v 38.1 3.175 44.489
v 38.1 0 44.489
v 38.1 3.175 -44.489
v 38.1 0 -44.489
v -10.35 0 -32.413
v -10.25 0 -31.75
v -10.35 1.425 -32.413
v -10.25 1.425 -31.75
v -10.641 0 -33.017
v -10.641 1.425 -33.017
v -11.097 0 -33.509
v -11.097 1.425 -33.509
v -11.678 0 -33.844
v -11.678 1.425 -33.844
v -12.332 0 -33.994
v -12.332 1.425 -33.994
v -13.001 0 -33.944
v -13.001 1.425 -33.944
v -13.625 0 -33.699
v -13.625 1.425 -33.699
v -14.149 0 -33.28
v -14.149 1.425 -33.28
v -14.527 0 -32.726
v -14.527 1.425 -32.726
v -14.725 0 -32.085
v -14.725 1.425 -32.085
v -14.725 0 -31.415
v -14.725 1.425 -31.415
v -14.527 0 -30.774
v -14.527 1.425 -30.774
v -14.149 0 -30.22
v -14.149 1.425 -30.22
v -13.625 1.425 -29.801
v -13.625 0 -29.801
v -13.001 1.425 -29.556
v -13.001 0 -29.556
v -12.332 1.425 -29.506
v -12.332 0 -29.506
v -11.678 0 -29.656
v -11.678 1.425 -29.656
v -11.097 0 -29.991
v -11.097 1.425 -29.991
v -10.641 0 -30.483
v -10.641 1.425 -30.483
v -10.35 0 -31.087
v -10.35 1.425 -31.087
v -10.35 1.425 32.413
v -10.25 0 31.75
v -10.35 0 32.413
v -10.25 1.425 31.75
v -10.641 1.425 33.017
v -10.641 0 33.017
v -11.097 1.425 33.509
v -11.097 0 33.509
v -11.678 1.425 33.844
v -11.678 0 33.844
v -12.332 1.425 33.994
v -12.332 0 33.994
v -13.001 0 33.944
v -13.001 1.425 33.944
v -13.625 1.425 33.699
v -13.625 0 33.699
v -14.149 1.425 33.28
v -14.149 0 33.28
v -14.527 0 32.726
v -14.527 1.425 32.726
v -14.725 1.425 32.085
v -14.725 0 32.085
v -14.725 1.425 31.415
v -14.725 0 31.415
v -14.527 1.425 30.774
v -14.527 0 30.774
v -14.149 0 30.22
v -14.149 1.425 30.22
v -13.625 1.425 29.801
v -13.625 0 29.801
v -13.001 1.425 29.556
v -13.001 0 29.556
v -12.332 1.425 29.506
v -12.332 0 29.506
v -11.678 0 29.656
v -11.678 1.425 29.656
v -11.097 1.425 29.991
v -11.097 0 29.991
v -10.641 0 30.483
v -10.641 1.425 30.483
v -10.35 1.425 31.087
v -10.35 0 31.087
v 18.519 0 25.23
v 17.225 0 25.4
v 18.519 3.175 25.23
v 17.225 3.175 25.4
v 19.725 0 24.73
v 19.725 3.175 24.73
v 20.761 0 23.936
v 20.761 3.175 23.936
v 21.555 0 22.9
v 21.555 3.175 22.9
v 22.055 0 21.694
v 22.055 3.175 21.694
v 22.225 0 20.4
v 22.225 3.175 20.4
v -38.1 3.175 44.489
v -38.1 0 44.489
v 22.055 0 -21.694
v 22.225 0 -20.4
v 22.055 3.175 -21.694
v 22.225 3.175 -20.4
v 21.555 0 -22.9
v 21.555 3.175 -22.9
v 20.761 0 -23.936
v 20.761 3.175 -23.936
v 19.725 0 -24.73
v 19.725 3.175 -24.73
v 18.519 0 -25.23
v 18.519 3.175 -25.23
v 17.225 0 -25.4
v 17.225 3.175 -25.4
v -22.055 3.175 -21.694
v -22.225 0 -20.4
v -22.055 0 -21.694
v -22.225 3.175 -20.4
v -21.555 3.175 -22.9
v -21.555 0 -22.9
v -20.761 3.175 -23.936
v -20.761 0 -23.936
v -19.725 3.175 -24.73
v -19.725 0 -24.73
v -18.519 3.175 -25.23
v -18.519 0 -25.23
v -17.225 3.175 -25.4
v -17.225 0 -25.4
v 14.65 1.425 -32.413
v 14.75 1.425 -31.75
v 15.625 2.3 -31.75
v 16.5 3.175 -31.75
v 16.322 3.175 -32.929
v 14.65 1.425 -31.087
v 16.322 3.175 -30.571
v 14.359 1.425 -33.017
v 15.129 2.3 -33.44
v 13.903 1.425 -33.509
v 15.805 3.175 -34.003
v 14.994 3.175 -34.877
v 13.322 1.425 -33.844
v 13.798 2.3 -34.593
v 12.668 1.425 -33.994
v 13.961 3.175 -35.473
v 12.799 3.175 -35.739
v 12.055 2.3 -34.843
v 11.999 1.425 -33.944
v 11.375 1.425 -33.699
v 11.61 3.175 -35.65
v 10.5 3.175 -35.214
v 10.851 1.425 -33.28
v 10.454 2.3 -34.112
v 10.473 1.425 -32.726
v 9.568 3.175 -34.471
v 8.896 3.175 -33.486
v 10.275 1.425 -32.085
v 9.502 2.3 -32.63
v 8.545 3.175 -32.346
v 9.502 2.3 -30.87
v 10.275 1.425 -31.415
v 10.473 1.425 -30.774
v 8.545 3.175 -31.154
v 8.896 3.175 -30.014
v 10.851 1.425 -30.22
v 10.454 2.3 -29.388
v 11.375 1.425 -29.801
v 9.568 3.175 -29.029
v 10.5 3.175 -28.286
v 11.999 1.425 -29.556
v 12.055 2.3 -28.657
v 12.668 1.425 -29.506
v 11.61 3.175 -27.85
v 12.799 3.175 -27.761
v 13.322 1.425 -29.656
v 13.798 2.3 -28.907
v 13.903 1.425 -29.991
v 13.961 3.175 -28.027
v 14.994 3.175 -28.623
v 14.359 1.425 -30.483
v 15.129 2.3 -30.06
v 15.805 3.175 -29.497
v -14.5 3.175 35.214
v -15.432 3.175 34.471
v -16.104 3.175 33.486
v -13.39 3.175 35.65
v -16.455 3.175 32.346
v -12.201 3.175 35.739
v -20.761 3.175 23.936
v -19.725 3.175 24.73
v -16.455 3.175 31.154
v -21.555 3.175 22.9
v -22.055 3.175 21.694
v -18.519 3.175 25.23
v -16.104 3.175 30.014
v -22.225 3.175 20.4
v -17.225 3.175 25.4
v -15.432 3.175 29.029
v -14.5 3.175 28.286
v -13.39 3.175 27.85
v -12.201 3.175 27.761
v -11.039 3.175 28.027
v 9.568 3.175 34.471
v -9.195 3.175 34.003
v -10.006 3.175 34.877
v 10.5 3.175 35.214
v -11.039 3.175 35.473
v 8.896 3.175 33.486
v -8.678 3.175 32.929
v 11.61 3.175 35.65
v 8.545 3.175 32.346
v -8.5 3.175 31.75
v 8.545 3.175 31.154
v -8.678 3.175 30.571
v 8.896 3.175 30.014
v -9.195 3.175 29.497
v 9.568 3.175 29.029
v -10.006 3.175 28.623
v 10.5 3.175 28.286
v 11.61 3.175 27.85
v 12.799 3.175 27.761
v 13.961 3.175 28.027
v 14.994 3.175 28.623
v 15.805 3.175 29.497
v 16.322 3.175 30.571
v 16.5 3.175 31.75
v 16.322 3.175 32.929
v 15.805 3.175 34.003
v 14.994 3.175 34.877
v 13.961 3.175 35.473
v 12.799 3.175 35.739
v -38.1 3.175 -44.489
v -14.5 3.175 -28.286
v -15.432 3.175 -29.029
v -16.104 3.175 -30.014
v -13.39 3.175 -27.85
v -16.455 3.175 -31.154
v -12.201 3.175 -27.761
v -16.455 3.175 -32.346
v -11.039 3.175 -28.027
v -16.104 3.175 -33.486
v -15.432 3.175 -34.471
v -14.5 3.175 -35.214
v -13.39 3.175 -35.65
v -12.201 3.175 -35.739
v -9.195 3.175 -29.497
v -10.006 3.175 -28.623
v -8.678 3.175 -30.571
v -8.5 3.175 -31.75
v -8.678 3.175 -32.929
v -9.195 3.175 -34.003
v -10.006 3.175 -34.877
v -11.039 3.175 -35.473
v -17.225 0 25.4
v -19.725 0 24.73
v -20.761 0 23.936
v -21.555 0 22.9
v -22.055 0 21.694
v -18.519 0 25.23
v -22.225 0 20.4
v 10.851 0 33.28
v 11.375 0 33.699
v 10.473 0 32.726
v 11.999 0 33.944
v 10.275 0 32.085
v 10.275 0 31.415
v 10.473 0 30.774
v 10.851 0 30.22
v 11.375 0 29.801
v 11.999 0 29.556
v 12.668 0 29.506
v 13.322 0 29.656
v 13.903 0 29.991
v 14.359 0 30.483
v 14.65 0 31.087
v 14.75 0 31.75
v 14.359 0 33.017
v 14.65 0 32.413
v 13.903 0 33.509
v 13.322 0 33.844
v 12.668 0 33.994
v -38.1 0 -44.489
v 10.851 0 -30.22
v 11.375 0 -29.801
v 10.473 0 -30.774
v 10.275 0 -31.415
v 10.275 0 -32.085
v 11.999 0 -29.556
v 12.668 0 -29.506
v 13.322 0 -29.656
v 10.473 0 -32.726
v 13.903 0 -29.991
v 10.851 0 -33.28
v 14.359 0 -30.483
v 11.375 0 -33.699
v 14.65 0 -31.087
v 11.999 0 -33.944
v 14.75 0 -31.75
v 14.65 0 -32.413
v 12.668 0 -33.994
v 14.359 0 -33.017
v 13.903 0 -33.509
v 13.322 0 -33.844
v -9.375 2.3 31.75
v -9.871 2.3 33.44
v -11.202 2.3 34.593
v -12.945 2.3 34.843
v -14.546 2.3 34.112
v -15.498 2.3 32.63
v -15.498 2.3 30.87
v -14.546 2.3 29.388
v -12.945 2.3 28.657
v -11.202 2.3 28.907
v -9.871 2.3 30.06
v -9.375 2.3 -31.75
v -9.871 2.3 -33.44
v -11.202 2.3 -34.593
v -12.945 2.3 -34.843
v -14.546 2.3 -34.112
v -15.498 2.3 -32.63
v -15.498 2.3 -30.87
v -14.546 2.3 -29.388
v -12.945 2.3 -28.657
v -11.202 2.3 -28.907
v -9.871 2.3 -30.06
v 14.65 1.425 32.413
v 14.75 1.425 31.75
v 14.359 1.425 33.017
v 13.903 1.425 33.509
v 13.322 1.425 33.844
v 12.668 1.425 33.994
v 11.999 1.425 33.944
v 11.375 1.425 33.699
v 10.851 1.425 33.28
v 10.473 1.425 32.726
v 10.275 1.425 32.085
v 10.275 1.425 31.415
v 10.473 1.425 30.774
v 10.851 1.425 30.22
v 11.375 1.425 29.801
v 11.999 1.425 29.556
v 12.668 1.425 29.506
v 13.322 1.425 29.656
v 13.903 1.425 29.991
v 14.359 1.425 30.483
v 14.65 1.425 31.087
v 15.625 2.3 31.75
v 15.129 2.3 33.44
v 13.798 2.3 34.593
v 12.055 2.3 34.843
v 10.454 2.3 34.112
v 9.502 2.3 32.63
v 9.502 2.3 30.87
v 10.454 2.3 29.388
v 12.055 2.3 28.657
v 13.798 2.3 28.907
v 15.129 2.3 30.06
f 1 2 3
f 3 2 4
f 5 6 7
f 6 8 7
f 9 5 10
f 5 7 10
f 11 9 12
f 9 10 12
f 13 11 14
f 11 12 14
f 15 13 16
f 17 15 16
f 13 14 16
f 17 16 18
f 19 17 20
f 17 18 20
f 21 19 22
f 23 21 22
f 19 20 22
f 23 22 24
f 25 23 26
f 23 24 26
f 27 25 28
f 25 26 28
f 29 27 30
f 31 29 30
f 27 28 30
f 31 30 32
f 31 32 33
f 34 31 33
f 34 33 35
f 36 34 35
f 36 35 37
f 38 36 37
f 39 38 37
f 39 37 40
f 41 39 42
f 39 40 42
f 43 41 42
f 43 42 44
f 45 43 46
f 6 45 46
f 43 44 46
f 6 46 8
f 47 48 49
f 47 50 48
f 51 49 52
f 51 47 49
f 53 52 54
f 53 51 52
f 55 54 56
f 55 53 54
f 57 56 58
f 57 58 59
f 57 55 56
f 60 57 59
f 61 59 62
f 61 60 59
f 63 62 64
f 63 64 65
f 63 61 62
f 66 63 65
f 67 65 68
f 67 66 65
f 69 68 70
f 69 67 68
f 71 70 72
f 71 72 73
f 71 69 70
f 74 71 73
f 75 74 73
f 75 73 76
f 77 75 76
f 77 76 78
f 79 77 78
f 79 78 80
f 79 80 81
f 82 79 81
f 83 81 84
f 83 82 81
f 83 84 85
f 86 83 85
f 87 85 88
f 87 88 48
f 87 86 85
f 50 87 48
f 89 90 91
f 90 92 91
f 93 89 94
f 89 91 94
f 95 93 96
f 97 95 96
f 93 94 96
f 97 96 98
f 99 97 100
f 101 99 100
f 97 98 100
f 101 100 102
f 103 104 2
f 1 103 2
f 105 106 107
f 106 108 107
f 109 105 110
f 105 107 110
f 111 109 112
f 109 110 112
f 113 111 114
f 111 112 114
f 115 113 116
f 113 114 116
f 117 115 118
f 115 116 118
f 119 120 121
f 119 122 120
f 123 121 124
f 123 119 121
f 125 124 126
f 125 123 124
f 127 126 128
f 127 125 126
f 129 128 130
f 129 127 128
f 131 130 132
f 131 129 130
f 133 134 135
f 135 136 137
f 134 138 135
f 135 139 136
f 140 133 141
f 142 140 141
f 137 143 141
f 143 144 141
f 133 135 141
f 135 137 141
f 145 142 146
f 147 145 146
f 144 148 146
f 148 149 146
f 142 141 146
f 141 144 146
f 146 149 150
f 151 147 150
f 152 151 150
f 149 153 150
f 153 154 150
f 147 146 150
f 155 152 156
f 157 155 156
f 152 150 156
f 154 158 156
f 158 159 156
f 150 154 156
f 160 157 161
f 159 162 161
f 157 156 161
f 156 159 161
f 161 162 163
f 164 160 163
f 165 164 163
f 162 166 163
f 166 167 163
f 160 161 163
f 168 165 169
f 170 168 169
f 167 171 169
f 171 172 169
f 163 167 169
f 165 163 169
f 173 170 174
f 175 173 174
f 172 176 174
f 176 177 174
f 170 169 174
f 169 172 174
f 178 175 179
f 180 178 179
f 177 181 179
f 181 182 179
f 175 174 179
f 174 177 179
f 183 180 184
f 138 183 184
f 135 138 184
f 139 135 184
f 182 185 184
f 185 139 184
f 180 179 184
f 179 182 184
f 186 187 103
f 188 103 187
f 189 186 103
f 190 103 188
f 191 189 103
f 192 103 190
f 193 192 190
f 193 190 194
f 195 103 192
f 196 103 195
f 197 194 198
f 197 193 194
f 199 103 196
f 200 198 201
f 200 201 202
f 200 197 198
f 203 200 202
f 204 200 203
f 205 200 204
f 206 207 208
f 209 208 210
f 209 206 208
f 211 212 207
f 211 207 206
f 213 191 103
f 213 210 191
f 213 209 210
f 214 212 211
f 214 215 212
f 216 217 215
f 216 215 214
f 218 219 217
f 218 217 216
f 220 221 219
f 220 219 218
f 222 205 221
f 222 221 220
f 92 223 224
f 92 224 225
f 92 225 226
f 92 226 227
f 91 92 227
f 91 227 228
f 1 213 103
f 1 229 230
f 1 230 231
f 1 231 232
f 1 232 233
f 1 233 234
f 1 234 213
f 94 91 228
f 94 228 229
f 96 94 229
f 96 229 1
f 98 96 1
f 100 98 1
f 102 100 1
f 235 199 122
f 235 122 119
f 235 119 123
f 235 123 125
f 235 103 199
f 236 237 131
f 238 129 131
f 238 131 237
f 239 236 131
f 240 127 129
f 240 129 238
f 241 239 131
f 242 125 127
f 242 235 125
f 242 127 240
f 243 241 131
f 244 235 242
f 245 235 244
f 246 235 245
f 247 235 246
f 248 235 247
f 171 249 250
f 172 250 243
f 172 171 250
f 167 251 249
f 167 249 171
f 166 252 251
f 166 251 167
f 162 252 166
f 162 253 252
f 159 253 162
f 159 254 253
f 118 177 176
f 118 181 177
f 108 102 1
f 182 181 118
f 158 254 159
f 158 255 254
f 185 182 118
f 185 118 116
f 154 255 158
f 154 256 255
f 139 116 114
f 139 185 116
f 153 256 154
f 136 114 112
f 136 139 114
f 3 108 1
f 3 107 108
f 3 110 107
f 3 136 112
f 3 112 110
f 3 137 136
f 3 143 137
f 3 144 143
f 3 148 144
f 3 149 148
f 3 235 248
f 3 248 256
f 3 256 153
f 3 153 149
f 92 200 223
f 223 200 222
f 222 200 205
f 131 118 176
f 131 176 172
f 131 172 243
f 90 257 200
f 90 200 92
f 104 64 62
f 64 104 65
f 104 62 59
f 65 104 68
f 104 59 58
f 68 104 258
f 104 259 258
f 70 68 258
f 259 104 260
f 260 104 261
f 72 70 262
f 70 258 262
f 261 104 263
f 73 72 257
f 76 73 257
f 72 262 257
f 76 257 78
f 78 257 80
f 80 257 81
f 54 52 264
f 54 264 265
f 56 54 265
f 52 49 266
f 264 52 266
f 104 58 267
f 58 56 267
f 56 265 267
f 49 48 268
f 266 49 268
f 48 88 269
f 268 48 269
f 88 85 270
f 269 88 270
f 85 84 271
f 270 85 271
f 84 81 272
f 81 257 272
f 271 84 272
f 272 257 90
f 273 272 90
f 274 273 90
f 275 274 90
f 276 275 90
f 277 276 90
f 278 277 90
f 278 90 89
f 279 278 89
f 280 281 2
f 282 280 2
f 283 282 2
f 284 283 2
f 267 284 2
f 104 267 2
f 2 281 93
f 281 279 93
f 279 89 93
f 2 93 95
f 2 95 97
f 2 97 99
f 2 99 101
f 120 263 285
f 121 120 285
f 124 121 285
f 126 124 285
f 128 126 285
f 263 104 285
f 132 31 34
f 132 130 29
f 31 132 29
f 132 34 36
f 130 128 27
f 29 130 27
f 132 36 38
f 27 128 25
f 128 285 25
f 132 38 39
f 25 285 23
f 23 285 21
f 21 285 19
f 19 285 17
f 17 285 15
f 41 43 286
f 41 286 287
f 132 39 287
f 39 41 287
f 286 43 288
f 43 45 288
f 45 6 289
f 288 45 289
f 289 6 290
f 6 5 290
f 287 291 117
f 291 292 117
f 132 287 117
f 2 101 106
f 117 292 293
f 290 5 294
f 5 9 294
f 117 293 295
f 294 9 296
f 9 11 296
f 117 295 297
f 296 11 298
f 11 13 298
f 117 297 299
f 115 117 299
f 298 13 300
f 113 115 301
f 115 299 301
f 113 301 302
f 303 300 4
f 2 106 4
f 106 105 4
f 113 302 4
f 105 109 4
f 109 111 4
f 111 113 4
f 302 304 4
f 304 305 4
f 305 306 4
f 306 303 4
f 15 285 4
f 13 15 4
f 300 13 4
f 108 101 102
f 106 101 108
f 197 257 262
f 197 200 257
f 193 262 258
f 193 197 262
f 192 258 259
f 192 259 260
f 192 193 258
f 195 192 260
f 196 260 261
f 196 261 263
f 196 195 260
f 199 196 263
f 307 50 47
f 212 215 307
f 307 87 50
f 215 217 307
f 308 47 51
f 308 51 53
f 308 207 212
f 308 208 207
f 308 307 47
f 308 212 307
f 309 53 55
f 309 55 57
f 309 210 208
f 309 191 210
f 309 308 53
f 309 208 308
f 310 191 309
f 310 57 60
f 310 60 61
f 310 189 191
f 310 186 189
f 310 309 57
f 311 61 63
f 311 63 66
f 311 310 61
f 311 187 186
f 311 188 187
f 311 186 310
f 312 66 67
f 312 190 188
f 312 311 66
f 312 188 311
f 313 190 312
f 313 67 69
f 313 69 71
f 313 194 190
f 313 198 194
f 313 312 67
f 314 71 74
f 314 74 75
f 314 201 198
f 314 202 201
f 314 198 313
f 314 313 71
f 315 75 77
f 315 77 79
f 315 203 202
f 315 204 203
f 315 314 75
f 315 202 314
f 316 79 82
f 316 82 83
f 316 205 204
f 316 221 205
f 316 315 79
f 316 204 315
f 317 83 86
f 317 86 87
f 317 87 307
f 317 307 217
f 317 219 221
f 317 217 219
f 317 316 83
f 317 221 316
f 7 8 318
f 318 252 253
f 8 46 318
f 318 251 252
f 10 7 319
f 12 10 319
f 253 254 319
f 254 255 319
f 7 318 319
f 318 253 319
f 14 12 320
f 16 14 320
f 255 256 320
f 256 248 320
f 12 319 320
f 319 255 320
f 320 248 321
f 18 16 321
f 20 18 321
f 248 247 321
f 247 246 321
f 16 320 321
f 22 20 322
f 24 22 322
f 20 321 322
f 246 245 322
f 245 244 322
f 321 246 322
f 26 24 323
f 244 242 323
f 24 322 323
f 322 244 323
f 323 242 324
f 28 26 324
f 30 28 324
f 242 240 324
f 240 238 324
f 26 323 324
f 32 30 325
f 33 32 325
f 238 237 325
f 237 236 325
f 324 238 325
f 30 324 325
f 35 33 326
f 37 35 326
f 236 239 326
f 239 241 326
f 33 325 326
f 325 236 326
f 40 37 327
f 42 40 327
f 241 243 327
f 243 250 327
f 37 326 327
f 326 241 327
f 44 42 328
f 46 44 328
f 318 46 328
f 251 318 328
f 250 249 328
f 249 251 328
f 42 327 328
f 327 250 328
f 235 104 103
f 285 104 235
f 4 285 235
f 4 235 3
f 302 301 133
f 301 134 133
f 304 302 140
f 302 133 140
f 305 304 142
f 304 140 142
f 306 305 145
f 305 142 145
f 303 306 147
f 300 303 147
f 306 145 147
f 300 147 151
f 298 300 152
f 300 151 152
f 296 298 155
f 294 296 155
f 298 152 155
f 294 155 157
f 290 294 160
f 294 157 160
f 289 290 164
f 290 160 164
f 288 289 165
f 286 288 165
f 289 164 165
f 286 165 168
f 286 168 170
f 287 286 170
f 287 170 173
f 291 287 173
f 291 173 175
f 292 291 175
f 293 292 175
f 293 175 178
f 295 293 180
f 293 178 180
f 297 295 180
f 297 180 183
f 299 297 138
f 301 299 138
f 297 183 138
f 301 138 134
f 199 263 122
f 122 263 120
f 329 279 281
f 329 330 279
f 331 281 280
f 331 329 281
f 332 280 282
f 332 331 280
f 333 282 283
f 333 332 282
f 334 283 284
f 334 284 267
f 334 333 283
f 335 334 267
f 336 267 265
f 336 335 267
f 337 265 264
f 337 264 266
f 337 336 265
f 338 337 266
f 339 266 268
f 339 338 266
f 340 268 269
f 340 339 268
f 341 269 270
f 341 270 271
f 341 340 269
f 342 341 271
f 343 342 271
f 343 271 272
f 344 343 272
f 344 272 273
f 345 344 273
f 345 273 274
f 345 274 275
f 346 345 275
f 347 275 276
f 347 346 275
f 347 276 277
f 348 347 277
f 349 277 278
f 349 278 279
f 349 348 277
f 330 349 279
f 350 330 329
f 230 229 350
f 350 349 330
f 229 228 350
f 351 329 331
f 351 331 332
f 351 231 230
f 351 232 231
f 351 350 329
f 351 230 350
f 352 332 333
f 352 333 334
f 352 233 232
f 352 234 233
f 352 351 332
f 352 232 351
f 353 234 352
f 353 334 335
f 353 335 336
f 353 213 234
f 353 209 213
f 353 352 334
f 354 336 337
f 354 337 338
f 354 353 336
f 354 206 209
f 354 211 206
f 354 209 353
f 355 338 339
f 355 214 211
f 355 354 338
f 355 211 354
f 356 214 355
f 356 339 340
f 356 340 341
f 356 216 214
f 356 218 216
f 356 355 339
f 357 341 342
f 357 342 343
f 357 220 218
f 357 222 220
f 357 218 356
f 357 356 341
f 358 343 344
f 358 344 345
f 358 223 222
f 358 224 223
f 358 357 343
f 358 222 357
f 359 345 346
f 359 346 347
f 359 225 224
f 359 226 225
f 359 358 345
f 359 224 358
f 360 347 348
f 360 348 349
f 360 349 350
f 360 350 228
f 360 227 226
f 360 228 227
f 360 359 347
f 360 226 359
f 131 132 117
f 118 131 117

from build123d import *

# Parameters (mm, degrees)
SKETCH1_W           = 76.2
SKETCH1_H           = 88.978
SKETCH1_W_2         = 44.45
SKETCH1_H_2         = 50.8
BOSS_EXTRUDE1_DEPTH = 3.175
FILLET1_R           = 5


# Read off the part's stored shape, not the designer's step: AdvancedHole1
with BuildPart() as part:
    # Sketch1 → Boss-Extrude1 (new body)
    with BuildSketch(Plane(origin=(0, 0, 0), x_dir=(1, 0, 0), z_dir=(0, 1, 0))):
        Rectangle(SKETCH1_W, SKETCH1_H)
        Rectangle(SKETCH1_W_2, SKETCH1_H_2, mode=Mode.SUBTRACT)
    extrude(amount=BOSS_EXTRUDE1_DEPTH)

    # AdvancedHole1 outline → AdvancedHole1 (revolve, cut)
    with BuildSketch(Plane(origin=(12.5, 0, -31.75), x_dir=(1, 0, 0), z_dir=(0, 0, 1))):
        Polygon((4, 3.175), (0, 3.175), (0, 0), (2.25, 0), (2.25, 1.425), align=None)
    advancedhole1 = revolve(axis=Axis((12.5, 0, -31.75), (0, 1, 0)), mode=Mode.SUBTRACT)

    # AdvancedHole1 2 outline → AdvancedHole1 2 (revolve, cut)
    with BuildSketch(Plane(origin=(-12.5, 0, -31.75), x_dir=(1, 0, 0), z_dir=(0, 0, 1))):
        Polygon((4, 3.175), (0, 3.175), (0, 0), (2.25, 0), (2.25, 1.425), align=None)
    advancedhole1_2 = revolve(axis=Axis((-12.5, 0, -31.75), (0, 1, 0)), mode=Mode.SUBTRACT)

    # Mirror1: AdvancedHole1, AdvancedHole1 2 across plane
    add(advancedhole1.mirror(Plane.XY), mode=Mode.SUBTRACT)
    add(advancedhole1_2.mirror(Plane.XY), mode=Mode.SUBTRACT)

    # Fillet1
    fillet1_edges = [part.edges().sort_by_distance(p)[0] for p in [
        (-22.225, 1.5875, -25.4),
        (-22.225, 1.5875, 25.4),
        (22.225, 1.5875, 25.4),
        (22.225, 1.5875, -25.4),
    ]]
    fillet(fillet1_edges, radius=FILLET1_R)


solid = part.part
